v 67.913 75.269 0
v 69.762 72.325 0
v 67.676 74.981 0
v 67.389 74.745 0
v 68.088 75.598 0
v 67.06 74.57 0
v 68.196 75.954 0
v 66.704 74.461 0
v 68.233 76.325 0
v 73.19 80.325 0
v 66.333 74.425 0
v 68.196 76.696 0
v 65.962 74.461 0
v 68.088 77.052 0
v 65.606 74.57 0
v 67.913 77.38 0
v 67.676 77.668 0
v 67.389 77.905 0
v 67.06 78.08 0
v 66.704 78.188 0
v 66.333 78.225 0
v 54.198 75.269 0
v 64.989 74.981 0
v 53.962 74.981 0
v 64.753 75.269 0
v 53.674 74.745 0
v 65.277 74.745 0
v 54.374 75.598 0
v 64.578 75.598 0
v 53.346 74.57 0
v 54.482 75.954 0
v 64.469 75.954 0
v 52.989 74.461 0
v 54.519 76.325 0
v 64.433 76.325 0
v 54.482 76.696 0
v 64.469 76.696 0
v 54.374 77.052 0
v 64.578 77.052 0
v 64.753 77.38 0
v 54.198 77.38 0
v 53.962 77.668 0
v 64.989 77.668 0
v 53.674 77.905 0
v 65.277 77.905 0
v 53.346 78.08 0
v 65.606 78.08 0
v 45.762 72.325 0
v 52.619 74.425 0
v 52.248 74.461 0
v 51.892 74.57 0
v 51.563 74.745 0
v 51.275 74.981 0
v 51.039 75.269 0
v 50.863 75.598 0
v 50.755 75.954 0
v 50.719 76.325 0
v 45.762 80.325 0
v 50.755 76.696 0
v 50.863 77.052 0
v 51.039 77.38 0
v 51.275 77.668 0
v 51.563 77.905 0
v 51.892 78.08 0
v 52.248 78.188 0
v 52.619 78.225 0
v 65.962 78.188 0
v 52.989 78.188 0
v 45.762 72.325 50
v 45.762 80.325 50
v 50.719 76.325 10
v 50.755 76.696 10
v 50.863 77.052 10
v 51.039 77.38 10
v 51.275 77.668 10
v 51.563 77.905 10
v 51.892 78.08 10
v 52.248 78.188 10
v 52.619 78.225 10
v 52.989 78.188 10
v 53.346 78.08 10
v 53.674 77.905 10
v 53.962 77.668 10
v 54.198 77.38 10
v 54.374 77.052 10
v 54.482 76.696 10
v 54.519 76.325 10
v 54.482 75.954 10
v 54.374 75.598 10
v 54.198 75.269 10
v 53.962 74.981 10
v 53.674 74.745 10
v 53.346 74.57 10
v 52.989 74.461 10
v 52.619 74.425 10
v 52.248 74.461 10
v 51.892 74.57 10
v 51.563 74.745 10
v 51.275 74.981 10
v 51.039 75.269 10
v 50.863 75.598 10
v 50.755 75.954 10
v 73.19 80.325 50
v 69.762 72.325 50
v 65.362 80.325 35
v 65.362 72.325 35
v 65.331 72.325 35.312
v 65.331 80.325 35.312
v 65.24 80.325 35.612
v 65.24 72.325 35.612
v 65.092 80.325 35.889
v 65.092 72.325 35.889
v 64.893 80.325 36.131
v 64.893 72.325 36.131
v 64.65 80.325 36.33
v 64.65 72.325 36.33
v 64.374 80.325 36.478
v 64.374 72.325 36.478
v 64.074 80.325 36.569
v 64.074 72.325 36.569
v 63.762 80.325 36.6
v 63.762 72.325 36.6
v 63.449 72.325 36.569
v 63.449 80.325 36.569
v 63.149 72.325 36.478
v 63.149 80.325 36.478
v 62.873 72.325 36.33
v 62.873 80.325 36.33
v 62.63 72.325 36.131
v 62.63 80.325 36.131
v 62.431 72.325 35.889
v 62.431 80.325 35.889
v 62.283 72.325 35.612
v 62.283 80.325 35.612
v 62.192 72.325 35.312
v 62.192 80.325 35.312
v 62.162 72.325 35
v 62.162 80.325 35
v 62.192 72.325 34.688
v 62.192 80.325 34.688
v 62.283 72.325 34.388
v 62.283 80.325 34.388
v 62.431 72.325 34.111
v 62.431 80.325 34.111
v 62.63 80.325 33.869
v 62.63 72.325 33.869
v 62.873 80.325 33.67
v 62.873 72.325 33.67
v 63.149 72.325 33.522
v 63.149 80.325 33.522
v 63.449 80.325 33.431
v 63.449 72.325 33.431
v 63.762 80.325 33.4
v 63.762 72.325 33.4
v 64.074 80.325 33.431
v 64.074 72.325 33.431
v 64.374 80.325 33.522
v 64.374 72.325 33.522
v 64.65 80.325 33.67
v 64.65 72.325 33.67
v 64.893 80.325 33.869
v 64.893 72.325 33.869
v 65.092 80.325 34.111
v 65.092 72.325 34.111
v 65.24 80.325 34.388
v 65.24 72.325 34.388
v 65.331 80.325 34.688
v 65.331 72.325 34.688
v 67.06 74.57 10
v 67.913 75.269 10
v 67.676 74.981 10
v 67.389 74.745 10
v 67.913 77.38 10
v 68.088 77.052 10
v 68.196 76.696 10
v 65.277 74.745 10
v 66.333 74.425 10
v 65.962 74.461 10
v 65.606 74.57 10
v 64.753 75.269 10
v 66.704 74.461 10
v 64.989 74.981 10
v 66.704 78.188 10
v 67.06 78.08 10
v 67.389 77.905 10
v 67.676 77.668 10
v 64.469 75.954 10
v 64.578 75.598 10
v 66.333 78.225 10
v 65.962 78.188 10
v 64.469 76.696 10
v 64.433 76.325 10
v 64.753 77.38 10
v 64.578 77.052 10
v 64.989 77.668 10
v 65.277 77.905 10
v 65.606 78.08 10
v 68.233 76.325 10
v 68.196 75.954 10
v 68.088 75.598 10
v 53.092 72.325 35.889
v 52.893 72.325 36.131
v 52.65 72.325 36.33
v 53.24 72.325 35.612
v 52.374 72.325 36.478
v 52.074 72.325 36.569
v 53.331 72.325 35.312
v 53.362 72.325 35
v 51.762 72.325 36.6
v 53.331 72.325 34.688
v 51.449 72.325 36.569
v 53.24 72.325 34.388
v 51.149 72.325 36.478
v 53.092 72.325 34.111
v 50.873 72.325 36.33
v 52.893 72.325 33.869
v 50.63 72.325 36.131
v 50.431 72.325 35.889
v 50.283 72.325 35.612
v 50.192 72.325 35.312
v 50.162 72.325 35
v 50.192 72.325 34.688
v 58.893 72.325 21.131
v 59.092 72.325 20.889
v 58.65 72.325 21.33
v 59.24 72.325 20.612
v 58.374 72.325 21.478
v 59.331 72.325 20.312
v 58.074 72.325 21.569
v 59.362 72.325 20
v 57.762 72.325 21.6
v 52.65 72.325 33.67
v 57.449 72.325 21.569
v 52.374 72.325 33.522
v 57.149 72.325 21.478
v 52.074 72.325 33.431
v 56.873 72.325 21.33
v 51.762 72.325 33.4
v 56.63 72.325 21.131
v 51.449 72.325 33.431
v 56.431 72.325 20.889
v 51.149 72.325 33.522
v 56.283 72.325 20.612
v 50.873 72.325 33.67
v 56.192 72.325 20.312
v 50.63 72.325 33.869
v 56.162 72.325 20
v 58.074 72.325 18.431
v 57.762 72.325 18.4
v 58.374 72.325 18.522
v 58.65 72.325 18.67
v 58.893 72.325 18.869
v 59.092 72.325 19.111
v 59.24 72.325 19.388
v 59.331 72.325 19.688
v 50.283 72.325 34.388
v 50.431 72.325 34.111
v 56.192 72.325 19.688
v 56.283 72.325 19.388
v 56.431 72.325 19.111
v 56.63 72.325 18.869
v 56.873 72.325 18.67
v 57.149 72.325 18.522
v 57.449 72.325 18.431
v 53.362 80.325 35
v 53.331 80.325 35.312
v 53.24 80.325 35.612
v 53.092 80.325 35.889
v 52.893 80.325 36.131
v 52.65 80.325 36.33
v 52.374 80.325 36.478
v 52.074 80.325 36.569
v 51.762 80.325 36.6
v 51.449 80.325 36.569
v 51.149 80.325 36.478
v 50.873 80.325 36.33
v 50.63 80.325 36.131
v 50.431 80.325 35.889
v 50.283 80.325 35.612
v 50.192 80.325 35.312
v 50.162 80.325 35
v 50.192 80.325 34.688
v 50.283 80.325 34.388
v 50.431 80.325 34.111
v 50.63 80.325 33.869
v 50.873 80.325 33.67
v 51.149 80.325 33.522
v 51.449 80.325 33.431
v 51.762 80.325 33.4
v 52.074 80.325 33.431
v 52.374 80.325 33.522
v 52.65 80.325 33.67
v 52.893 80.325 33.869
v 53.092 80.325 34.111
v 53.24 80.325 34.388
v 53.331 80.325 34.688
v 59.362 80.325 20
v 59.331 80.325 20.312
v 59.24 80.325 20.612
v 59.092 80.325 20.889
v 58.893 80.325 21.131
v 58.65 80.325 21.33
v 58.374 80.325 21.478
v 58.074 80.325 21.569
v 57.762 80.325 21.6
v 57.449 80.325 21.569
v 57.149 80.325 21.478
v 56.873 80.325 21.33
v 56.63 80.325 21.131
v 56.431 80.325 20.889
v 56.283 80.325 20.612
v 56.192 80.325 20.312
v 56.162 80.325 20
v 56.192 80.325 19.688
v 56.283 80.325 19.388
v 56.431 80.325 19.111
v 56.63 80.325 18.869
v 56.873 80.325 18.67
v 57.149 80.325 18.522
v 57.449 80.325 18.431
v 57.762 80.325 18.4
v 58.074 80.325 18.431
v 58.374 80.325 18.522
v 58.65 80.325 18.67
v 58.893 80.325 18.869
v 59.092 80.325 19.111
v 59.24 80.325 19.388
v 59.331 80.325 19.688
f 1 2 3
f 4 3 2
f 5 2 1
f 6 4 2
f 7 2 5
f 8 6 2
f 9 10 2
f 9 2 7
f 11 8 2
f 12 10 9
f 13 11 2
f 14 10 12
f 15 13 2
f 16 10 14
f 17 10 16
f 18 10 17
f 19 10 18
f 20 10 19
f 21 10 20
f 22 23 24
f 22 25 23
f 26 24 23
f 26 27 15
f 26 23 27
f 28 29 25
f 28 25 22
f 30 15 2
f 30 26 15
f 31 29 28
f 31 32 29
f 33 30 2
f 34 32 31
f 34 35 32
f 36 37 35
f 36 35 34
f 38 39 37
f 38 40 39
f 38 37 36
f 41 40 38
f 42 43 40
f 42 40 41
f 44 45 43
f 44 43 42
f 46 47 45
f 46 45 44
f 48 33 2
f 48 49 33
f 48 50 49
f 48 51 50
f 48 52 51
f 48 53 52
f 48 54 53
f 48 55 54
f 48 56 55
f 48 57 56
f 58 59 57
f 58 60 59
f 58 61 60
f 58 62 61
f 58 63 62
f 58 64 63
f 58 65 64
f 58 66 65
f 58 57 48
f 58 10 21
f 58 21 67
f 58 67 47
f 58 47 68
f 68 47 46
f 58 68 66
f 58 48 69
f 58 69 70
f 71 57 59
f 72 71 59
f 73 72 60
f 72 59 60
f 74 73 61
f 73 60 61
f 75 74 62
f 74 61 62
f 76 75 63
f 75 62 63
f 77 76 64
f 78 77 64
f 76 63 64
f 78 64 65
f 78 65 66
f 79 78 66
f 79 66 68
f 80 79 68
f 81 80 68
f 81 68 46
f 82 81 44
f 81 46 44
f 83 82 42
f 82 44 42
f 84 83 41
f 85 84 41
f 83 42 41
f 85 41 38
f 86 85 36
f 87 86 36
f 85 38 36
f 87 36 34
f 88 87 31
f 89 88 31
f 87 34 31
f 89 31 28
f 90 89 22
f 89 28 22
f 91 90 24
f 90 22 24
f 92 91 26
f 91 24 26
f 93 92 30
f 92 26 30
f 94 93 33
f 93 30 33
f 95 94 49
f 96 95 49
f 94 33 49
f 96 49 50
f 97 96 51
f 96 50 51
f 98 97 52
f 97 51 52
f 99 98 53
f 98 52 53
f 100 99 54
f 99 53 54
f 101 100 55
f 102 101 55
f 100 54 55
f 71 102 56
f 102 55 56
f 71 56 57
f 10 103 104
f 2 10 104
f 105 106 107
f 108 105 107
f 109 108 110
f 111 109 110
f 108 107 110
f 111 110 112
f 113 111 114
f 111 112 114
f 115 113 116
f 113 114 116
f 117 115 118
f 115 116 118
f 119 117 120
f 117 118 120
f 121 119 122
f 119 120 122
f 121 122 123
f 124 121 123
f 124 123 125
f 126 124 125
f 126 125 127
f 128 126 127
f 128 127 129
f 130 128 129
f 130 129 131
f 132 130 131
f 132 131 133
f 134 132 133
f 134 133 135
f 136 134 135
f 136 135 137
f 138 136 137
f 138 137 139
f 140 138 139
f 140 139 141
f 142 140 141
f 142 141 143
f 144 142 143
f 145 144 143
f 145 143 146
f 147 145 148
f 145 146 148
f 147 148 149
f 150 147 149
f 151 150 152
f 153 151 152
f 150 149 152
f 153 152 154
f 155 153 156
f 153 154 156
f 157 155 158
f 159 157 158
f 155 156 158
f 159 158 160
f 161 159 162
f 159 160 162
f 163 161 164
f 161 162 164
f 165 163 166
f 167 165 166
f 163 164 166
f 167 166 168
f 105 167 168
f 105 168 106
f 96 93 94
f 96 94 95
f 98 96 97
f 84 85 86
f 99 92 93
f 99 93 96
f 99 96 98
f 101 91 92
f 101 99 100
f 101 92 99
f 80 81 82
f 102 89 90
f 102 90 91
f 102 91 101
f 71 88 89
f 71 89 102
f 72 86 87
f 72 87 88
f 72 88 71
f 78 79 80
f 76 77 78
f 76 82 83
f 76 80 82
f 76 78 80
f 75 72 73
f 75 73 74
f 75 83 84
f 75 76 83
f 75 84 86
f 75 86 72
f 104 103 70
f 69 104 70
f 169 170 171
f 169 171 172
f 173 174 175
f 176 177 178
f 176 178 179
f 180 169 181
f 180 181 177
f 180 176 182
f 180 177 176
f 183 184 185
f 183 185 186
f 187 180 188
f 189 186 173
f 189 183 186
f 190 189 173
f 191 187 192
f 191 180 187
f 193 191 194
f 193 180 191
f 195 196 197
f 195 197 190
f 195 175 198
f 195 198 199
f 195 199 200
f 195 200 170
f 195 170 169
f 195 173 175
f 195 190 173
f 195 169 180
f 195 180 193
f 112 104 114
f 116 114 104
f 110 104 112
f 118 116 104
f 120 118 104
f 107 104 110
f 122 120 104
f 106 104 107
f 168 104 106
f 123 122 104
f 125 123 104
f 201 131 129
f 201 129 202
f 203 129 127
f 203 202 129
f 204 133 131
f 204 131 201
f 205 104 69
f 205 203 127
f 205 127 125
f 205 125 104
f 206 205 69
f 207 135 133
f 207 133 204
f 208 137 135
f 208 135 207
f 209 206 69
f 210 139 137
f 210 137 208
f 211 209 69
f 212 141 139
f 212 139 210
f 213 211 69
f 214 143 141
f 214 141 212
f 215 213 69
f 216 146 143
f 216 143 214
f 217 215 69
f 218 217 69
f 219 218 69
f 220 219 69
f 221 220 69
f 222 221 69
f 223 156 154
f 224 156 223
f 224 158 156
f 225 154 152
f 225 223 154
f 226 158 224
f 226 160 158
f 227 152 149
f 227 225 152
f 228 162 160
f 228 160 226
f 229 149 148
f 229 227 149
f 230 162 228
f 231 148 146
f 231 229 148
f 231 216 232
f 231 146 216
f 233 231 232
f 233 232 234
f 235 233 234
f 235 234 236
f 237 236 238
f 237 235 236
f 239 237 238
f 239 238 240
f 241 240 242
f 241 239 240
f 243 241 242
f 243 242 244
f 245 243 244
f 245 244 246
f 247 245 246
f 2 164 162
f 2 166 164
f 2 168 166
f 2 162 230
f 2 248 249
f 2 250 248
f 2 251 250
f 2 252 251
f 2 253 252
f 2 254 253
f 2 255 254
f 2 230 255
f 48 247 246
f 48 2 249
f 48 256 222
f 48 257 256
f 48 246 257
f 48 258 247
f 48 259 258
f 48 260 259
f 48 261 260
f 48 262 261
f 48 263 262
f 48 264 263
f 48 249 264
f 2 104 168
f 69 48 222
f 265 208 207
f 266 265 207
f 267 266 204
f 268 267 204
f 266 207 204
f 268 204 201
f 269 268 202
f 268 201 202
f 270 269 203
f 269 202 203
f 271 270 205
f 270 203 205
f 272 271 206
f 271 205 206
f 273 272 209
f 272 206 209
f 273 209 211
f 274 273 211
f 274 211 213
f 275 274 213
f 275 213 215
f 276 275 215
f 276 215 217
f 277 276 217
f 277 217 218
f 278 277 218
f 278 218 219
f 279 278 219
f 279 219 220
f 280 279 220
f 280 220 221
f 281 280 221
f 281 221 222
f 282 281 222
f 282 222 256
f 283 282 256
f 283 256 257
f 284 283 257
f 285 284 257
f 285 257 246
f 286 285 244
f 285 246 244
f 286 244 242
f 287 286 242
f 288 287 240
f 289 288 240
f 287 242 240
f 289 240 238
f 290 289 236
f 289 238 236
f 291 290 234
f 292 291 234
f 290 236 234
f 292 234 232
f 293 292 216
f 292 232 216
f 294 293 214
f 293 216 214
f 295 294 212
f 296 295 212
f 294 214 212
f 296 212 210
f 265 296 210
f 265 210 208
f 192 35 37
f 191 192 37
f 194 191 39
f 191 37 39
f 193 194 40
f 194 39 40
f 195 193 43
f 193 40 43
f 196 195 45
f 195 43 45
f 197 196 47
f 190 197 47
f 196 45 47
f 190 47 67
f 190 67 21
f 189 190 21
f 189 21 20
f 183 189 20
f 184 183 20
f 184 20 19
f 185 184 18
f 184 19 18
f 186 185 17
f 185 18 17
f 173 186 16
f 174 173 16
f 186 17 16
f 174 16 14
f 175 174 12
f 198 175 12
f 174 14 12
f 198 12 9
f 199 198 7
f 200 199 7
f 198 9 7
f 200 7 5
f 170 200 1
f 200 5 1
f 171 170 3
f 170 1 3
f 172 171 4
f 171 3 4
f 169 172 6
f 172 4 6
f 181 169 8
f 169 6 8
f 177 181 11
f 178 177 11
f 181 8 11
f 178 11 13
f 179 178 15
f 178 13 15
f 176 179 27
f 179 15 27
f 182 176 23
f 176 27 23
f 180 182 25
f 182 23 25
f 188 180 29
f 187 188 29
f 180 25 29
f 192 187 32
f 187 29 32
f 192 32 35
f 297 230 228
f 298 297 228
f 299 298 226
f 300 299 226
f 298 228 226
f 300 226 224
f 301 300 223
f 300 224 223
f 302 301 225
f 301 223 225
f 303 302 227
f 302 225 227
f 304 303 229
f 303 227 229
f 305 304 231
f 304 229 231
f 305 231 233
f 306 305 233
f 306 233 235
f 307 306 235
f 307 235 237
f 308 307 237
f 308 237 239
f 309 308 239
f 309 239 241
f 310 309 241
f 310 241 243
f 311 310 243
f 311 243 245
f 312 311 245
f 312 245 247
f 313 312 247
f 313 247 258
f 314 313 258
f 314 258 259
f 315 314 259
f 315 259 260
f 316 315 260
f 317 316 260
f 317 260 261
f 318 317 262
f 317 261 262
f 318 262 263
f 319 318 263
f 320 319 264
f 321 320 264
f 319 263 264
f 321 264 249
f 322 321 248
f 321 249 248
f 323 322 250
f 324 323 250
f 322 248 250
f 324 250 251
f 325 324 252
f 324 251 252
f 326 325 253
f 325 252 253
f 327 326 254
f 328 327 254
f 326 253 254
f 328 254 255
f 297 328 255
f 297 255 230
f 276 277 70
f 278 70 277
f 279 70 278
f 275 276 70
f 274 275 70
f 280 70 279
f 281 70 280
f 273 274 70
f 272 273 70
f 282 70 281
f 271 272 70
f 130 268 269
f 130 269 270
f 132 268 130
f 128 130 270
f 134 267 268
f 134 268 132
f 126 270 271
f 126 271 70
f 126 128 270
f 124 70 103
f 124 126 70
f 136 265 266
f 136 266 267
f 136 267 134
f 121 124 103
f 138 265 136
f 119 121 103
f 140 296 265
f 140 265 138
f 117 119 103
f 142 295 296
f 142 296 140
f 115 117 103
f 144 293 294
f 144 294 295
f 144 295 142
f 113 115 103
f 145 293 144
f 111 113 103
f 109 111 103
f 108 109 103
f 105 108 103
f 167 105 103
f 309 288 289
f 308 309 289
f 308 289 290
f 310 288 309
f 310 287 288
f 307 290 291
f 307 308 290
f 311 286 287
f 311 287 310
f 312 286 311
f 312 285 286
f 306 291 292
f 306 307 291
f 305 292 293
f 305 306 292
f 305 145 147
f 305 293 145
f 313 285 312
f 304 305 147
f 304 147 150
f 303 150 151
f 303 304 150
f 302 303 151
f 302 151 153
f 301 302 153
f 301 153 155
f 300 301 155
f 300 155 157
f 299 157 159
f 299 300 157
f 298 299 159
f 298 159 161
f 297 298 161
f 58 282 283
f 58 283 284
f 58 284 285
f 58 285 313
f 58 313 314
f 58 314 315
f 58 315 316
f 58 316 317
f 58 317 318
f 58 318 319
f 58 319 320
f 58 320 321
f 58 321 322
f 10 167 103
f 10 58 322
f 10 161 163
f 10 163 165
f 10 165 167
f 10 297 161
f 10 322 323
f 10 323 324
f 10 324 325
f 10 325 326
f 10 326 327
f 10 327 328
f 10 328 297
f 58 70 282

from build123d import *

# Parameters (mm, degrees)
SALIENTE_EXTRUIR1_DEPTH = 50
CORTAR_EXTRUIR1_REACH   = 10
CROQUIS3_R              = 1.6
CROQUIS6_R              = 1.9
CORTAR_EXTRUIR3_DEPTH   = 10


with BuildPart() as part:
    # Croquis1 → Saliente-Extruir1 (new body)
    with BuildSketch(Plane.XY):
        Polygon((45.761533754, 80.324875029), (73.190105182, 80.324875029), (69.761533754, 72.324875029), (45.761533754, 72.324875029), align=None)
    extrude(amount=SALIENTE_EXTRUIR1_DEPTH)

    # Croquis3 → Cortar-Extruir1 (cut, up to next)
    with BuildSketch(Plane.XZ.offset(-72.324875029), mode=Mode.PRIVATE) as cortar_extruir1_sk1:
        with Locations((63.761533754, 35)):
            Circle(CROQUIS3_R)
    cortar_extruir1_tool1 = extrude(cortar_extruir1_sk1.sketch, amount=-CORTAR_EXTRUIR1_REACH, mode=Mode.PRIVATE) & part.part
    add(cortar_extruir1_tool1.solids().sort_by_distance((63.761534, 72.324875, 35))[0], mode=Mode.SUBTRACT)
    # Croquis3 → Cortar-Extruir1 (cut, up to next)
    with BuildSketch(Plane.XZ.offset(-72.324875029), mode=Mode.PRIVATE) as cortar_extruir1_sk2:
        with Locations((57.761533754, 20)):
            Circle(CROQUIS3_R)
    cortar_extruir1_tool2 = extrude(cortar_extruir1_sk2.sketch, amount=-CORTAR_EXTRUIR1_REACH, mode=Mode.PRIVATE) & part.part
    add(cortar_extruir1_tool2.solids().sort_by_distance((57.761534, 72.324875, 20))[0], mode=Mode.SUBTRACT)
    # Croquis3 → Cortar-Extruir1 (cut, up to next)
    with BuildSketch(Plane.XZ.offset(-72.324875029), mode=Mode.PRIVATE) as cortar_extruir1_sk3:
        with Locations((51.761533754, 35)):
            Circle(CROQUIS3_R)
    cortar_extruir1_tool3 = extrude(cortar_extruir1_sk3.sketch, amount=-CORTAR_EXTRUIR1_REACH, mode=Mode.PRIVATE) & part.part
    add(cortar_extruir1_tool3.solids().sort_by_distance((51.761534, 72.324875, 35))[0], mode=Mode.SUBTRACT)

    # Croquis6 → Cortar-Extruir3 (cut)
    with BuildSketch(Plane(origin=(0, 0, 0), x_dir=(-1, 0, 0), z_dir=(0, 0, -1))):
        with Locations((-66.332962325, 76.324875029)):
            Circle(CROQUIS6_R)
        with Locations((-52.618676611, 76.324875029)):
            Circle(CROQUIS6_R)
    extrude(amount=-CORTAR_EXTRUIR3_DEPTH, mode=Mode.SUBTRACT)


solid = part.part
